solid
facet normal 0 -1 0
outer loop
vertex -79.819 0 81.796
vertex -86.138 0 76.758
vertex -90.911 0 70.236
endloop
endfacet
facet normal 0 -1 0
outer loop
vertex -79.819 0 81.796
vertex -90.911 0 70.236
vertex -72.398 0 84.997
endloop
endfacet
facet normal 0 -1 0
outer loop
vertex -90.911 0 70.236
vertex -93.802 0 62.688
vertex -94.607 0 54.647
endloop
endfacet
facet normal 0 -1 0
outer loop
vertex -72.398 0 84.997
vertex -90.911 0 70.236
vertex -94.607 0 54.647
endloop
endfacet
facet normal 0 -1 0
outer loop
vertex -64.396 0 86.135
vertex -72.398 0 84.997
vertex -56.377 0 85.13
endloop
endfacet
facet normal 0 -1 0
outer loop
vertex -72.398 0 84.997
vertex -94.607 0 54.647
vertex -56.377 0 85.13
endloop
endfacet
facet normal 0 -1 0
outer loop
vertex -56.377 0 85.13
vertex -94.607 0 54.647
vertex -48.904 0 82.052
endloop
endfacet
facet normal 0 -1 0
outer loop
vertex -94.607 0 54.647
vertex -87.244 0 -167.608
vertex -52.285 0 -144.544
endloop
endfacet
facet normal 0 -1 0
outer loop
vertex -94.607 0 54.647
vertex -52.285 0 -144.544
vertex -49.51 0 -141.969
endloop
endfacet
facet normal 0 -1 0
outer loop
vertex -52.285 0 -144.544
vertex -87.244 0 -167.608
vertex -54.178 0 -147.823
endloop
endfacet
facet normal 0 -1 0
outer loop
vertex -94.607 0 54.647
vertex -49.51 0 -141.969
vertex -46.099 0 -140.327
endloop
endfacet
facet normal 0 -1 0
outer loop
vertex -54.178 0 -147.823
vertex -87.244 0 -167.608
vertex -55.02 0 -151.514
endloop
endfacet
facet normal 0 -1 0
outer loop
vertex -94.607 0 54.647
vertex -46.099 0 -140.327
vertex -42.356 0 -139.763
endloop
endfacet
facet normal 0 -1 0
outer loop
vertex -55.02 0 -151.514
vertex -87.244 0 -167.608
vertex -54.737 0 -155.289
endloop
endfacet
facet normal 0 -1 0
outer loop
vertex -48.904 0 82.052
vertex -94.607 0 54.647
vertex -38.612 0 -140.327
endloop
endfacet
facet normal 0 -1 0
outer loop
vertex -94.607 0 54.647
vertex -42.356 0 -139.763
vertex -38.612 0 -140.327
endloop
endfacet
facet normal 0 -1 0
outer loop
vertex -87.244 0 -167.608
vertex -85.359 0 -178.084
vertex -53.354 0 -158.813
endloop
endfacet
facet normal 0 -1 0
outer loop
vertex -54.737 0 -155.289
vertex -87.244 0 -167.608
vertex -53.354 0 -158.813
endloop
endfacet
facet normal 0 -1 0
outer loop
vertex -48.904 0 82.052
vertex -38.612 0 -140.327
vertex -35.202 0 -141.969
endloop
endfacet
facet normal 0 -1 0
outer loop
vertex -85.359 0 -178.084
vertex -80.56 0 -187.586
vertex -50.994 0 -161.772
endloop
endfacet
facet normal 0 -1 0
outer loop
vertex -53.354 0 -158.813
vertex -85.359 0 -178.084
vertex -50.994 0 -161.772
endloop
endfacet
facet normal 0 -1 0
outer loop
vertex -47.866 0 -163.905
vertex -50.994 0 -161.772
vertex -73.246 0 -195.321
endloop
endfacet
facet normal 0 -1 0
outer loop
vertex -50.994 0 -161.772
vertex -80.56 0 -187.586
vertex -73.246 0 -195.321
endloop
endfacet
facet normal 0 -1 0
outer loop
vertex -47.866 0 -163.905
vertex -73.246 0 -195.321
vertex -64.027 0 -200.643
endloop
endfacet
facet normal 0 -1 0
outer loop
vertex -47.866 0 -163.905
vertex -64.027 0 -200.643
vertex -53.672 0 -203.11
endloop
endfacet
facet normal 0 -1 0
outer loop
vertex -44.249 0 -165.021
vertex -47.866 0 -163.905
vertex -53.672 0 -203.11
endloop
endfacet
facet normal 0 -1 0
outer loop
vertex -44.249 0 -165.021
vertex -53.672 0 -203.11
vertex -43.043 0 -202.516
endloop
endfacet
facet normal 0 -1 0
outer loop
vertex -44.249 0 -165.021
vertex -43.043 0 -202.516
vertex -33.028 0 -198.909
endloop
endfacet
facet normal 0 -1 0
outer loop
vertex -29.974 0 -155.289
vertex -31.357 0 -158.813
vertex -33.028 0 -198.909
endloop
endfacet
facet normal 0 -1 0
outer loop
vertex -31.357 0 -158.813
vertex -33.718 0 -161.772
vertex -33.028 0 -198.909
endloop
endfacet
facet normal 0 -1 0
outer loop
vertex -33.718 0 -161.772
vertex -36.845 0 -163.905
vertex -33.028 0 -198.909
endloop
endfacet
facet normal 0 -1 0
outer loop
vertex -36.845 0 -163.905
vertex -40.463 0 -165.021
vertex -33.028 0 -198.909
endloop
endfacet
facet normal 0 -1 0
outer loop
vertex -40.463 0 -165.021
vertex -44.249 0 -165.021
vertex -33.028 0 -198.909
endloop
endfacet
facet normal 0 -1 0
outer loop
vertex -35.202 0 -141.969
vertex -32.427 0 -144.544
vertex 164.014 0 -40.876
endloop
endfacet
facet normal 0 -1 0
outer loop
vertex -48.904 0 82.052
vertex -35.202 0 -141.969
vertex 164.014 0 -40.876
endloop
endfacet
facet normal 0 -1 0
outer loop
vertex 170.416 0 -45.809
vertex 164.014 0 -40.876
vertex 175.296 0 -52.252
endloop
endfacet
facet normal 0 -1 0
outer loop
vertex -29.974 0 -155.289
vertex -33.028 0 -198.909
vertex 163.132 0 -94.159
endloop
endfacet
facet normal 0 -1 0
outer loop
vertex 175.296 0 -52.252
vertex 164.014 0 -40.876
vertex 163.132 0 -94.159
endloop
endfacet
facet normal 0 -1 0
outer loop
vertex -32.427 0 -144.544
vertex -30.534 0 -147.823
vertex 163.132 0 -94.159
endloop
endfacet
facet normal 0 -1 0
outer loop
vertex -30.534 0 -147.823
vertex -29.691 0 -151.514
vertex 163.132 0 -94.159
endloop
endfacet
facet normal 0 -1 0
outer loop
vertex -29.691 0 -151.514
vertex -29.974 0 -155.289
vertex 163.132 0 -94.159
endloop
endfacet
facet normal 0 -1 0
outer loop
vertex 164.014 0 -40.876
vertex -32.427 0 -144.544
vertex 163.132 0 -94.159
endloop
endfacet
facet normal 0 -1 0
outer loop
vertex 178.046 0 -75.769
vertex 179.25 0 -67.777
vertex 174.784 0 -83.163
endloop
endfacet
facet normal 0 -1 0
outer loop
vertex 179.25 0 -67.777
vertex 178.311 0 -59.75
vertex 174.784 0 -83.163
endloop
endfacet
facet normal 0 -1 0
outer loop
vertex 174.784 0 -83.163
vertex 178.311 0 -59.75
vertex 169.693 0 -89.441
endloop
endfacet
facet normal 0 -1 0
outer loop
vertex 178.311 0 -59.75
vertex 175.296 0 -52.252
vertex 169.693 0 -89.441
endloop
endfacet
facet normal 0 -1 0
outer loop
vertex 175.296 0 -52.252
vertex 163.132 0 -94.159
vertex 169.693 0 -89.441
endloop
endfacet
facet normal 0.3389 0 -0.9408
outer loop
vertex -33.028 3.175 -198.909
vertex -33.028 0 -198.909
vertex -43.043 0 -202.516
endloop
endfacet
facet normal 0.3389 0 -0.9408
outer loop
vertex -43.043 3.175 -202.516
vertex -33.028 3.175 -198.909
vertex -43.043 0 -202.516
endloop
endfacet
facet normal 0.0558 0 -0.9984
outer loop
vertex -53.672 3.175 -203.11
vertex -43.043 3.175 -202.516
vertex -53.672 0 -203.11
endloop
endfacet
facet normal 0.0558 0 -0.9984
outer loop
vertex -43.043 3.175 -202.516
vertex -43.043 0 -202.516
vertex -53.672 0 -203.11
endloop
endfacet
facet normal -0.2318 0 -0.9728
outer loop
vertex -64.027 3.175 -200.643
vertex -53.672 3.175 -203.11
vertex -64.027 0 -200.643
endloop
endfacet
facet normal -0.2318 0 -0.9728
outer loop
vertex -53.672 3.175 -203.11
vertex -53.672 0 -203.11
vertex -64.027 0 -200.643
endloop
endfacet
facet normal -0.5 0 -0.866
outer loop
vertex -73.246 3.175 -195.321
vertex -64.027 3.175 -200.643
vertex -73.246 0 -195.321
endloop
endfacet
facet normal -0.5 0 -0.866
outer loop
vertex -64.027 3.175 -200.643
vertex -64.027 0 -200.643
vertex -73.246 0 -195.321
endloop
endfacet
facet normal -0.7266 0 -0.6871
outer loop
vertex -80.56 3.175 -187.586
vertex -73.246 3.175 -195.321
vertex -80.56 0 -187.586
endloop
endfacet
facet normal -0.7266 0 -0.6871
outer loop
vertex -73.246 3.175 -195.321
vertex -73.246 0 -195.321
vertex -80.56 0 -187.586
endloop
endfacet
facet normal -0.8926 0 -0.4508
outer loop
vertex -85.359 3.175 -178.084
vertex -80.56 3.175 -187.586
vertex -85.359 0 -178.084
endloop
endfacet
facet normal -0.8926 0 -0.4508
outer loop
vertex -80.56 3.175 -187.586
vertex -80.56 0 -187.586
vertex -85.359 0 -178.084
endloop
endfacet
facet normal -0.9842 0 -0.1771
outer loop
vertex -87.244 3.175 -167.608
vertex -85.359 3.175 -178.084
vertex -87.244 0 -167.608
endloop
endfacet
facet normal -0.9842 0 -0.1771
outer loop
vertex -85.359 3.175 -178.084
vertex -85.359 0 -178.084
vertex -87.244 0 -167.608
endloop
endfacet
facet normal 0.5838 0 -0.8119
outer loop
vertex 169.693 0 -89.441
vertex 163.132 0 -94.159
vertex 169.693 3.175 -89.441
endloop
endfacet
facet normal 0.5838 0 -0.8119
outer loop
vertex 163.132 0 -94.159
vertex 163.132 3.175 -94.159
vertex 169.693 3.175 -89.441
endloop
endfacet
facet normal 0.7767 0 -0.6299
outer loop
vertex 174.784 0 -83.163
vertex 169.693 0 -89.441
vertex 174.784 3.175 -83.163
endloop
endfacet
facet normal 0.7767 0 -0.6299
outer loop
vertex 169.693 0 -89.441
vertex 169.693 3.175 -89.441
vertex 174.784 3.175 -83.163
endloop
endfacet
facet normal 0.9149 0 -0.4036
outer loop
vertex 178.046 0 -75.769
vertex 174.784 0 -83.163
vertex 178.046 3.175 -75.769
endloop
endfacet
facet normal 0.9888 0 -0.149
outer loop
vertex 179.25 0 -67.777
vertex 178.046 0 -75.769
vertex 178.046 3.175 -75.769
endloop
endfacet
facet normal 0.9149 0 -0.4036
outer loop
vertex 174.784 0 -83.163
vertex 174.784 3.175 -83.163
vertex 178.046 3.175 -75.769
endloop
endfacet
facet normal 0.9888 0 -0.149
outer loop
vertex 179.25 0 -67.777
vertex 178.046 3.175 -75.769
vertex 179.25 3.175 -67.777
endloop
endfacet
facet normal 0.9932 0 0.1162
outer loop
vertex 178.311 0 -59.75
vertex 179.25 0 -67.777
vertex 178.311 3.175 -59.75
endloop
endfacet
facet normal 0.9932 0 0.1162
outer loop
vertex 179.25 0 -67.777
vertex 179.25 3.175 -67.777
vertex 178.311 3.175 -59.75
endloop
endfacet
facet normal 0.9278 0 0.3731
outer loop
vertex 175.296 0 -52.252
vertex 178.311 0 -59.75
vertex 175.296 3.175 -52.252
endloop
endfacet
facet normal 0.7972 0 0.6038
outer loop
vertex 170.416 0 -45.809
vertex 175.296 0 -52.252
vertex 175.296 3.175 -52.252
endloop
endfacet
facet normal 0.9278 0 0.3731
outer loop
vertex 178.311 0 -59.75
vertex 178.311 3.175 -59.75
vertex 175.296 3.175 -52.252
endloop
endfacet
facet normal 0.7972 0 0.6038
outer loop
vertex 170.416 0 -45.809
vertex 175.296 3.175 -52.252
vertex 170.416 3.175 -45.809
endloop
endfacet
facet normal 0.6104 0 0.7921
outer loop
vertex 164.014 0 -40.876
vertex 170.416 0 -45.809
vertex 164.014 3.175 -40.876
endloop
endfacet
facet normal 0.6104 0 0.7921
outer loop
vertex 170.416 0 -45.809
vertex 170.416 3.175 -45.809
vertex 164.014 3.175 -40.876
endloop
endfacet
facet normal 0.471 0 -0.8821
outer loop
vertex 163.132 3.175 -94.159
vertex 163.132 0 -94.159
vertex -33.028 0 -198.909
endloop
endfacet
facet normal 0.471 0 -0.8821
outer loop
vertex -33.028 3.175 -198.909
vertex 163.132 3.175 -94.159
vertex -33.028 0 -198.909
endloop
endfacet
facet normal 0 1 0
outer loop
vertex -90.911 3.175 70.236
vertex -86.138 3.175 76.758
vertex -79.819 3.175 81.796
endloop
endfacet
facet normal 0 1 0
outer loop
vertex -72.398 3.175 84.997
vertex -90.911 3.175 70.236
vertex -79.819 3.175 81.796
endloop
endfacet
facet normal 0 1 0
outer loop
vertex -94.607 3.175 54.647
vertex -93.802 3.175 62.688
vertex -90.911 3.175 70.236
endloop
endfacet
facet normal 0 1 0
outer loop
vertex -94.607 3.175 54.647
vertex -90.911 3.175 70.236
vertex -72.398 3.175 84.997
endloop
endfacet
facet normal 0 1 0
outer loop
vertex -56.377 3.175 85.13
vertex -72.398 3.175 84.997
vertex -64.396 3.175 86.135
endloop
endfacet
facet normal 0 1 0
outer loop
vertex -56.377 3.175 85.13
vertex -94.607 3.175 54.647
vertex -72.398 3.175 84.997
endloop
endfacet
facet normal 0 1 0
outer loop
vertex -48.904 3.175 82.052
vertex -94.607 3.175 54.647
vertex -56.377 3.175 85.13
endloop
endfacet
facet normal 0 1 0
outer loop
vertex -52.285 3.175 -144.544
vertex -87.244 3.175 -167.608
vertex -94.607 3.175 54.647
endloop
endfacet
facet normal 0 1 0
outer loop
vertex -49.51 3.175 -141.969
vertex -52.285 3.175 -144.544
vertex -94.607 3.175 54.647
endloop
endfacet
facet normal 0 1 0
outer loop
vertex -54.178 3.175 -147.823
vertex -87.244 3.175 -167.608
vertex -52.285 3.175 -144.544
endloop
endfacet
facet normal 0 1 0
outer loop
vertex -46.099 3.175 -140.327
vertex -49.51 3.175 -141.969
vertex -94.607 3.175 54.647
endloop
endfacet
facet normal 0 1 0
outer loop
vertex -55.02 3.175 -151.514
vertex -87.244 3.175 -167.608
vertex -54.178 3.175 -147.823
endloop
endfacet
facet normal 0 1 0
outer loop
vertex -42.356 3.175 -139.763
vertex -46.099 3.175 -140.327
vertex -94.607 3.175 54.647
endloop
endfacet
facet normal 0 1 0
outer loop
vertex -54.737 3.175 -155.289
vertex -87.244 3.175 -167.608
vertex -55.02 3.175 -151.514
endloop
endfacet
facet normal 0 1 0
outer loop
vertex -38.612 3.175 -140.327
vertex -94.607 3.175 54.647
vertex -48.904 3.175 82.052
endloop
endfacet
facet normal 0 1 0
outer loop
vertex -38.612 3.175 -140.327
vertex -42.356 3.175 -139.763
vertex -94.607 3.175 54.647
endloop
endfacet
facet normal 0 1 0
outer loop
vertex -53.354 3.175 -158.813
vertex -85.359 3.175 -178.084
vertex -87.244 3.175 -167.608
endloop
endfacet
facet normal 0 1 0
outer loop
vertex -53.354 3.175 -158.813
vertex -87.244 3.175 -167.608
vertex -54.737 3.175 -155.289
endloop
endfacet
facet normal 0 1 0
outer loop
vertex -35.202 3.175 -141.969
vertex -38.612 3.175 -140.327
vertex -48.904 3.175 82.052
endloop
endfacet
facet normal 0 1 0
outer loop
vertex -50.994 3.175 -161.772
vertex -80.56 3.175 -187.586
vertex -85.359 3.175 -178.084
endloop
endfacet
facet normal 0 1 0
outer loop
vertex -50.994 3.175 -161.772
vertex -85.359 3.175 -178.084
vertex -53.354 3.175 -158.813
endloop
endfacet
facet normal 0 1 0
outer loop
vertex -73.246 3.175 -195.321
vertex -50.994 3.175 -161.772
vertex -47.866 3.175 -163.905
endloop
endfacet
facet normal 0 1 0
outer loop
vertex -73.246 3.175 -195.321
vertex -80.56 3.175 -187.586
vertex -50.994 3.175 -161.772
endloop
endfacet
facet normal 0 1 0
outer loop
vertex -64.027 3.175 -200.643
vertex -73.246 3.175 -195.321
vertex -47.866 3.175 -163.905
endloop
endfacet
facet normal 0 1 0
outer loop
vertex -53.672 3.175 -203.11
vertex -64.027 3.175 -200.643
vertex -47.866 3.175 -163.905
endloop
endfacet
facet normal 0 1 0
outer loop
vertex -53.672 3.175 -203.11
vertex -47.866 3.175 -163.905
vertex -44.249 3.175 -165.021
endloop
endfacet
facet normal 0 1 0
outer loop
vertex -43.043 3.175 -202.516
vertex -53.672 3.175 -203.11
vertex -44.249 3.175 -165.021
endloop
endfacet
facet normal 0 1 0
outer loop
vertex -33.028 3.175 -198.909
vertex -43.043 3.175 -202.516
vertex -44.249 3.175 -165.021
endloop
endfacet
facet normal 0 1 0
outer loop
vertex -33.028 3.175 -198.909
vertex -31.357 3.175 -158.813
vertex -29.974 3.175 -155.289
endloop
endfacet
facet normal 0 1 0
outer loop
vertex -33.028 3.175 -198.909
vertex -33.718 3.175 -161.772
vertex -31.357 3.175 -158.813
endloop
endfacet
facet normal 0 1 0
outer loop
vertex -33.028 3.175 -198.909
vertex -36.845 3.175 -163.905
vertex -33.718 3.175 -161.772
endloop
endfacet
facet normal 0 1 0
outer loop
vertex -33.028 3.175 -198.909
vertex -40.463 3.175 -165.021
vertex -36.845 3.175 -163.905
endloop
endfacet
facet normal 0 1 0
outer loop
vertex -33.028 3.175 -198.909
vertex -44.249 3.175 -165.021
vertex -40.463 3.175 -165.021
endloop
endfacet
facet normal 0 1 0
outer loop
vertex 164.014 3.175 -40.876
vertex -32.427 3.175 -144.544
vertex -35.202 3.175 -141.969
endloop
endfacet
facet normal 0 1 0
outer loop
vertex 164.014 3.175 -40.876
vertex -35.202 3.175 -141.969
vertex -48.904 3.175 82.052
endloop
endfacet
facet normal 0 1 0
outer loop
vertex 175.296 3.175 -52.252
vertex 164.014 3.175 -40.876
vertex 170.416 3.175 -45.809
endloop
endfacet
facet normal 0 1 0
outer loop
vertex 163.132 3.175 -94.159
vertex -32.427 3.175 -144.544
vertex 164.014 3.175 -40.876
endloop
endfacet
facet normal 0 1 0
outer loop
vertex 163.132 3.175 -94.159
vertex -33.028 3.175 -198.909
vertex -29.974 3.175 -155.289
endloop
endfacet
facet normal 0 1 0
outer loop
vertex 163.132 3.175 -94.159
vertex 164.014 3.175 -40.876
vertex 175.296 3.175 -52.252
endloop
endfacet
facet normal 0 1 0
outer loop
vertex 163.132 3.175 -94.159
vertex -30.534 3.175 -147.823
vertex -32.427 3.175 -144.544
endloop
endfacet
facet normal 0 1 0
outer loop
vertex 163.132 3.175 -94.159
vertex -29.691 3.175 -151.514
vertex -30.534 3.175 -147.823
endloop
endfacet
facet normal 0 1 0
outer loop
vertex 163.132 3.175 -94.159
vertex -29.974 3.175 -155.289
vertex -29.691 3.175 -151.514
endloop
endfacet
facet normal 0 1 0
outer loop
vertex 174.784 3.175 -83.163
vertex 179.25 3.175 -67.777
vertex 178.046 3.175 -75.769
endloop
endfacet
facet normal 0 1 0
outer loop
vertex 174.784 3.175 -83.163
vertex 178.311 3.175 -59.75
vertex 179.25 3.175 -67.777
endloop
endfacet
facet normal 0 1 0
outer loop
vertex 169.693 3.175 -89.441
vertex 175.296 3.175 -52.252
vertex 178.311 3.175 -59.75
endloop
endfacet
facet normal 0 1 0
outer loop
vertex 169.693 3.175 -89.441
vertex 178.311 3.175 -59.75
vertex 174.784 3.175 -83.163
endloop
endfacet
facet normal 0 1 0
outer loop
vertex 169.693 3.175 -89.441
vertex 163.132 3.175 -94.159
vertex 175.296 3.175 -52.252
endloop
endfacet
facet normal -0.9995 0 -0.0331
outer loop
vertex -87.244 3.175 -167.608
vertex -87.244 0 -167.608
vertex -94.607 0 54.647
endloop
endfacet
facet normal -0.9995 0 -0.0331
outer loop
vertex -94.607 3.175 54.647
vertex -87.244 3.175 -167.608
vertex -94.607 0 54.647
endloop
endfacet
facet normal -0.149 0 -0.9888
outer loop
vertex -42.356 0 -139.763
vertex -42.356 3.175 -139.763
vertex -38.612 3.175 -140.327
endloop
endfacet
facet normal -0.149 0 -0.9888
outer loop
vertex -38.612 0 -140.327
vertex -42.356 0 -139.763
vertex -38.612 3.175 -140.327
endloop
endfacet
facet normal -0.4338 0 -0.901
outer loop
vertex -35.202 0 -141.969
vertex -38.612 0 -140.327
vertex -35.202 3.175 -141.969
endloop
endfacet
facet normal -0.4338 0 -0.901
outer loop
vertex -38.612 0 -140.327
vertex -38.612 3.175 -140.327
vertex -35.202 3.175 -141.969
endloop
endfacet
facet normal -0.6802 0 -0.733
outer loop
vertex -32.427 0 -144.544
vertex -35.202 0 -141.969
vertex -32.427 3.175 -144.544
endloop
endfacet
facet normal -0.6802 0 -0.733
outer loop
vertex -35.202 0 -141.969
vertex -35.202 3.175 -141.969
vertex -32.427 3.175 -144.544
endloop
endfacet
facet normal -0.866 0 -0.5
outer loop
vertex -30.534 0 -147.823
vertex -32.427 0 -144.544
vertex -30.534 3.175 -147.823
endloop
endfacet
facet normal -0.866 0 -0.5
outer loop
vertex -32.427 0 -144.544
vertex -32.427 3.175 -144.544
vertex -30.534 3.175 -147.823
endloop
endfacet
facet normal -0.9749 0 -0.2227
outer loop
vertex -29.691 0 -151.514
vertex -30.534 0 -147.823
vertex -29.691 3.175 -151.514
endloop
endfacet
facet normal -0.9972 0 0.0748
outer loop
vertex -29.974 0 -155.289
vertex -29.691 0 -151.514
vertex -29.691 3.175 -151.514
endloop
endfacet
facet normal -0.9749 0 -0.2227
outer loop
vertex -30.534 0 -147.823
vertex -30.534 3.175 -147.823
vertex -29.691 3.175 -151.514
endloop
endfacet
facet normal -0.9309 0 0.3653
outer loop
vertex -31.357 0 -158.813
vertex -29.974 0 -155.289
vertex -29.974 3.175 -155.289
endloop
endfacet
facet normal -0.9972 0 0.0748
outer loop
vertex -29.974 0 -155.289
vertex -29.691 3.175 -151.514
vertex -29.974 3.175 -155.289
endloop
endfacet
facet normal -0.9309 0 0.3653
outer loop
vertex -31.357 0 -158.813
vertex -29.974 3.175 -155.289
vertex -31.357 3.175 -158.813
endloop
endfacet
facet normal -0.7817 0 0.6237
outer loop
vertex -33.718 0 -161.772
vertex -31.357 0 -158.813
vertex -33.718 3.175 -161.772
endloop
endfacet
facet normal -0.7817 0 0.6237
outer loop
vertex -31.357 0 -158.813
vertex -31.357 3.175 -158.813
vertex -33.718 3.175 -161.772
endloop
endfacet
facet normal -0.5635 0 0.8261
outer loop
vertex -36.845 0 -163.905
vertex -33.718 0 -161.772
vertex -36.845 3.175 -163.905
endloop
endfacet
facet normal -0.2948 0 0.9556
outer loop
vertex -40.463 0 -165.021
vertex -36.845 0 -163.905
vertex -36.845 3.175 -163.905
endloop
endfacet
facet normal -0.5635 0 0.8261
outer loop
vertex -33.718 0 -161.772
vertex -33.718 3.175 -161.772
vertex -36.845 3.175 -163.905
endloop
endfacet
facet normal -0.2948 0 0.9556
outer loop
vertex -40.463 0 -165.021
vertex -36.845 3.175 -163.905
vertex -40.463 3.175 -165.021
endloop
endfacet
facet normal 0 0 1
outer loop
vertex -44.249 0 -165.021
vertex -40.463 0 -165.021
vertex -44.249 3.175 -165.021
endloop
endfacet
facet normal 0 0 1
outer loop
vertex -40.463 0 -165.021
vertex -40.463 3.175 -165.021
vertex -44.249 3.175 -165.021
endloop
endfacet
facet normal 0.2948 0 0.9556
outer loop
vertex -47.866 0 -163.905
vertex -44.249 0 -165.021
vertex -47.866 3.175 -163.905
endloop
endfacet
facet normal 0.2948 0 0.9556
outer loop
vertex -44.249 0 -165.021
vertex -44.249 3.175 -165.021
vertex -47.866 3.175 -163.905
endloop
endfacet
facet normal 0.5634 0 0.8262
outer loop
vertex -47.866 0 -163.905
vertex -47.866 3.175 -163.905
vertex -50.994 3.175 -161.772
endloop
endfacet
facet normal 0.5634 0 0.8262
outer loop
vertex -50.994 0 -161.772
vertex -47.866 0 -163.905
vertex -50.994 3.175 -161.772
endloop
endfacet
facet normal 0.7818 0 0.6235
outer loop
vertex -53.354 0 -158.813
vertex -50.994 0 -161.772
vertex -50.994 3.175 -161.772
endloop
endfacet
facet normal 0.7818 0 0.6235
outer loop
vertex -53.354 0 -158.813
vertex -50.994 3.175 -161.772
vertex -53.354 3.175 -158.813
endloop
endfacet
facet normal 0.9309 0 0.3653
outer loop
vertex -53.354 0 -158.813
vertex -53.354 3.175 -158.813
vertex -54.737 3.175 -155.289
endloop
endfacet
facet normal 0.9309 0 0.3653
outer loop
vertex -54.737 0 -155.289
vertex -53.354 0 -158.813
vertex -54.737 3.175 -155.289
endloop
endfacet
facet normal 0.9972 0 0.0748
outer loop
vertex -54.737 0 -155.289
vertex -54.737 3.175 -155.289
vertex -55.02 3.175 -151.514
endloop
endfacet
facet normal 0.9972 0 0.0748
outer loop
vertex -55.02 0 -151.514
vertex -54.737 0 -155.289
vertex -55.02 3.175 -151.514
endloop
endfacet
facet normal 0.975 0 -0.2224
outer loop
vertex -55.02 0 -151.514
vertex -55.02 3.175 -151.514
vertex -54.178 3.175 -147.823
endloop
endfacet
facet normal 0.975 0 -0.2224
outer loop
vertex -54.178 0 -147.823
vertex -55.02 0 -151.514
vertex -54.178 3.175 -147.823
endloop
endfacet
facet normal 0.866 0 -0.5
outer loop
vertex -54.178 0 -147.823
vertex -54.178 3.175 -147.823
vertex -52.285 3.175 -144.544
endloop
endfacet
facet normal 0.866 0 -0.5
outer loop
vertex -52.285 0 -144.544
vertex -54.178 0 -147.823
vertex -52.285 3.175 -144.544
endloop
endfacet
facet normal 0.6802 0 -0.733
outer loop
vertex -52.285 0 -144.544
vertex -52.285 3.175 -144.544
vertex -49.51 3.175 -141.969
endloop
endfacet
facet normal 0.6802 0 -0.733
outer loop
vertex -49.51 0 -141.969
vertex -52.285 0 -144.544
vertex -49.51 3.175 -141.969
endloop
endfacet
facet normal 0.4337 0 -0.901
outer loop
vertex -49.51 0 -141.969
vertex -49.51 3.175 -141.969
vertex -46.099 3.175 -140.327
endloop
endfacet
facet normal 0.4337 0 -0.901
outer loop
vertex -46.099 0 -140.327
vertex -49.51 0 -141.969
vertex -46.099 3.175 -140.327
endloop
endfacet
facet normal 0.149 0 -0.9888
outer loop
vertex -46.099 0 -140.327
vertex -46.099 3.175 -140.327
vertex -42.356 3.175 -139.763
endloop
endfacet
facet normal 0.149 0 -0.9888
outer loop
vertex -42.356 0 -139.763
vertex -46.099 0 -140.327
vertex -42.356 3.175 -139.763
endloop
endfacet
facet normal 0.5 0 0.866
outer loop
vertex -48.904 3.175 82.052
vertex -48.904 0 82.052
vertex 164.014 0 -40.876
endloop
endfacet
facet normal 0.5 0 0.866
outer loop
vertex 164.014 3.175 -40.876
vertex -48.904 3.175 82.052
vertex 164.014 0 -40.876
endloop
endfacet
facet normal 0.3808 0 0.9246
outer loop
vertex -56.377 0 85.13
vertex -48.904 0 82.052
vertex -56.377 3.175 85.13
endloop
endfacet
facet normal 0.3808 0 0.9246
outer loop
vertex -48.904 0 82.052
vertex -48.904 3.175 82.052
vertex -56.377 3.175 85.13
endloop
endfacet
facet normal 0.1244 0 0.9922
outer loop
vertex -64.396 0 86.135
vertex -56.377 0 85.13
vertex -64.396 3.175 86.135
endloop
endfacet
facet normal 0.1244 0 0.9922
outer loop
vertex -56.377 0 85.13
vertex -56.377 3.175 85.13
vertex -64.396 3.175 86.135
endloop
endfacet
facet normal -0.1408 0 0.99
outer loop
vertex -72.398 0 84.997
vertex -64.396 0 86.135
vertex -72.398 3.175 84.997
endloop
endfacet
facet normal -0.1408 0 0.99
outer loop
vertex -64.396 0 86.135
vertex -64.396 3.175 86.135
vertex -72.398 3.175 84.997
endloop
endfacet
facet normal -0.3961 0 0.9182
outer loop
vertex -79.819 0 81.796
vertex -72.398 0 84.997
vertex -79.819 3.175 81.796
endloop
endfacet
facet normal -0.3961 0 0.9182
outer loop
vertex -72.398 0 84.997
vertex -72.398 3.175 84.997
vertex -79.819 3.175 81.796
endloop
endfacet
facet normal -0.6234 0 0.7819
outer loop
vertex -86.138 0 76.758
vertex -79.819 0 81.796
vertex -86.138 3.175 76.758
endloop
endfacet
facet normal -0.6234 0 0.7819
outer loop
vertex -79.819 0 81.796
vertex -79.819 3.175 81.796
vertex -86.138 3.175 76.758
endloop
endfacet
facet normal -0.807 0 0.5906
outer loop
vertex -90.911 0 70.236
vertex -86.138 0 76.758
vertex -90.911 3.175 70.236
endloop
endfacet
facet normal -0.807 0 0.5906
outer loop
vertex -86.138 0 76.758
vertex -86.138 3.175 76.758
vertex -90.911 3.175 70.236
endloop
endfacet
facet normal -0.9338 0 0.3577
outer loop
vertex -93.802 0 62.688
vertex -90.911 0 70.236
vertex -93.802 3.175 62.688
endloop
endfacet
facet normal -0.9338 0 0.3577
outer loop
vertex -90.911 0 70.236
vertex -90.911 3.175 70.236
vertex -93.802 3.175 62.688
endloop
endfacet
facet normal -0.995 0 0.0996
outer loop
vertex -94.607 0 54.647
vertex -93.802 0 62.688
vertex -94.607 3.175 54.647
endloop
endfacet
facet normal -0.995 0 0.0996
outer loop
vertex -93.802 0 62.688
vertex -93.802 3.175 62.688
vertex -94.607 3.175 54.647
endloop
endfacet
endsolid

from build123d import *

# Parameters (mm, degrees)
BOSS_EXTRUDE1_DEPTH = 3.175
SKETCH2_R           = 12.7
CUT_EXTRUDE1_DEPTH  = 76.2
FILLET1_R           = 30.48


with BuildPart() as part:
    # Sketch1 → Boss-Extrude1 (new body)
    with BuildSketch(Plane(origin=(0, 0, 0), x_dir=(1, 0, 0), z_dir=(0, 1, 0))):
        with BuildLine():
            Line((211.534409722, 68.311873697), (-33.027609136, 198.909430038))
            ThreePointArc((-33.027609136, 198.909430038), (-68.829570139, 198.316531428), (-87.244015898, 167.607572999))
            Line((-87.244015898, 167.607572999), (-96.424223864, -109.488126303))
            Line((-96.424223864, -109.488126303), (211.534409722, 68.311873697))
        make_face()
    extrude(amount=BOSS_EXTRUDE1_DEPTH)

    # Sketch2 → Cut-Extrude1 (cut)
    with BuildSketch(Plane(origin=(0, 3.175, 0), x_dir=(1, 0, 0), z_dir=(0, 1, 0))):
        with Locations(Location((-42.355812517, 152.46263816, 0), (0, 0, 270))):
            Circle(SKETCH2_R)
    extrude(amount=-CUT_EXTRUDE1_DEPTH, mode=Mode.SUBTRACT)

    # Fillet1
    fillet1_edges = [part.edges().sort_by_distance(p)[0] for p in [
        (211.534409722, 1.5875, -68.311873697),
        (-96.424223864, 1.5875, 109.488126303),
    ]]
    fillet(fillet1_edges, radius=FILLET1_R)


solid = part.part
